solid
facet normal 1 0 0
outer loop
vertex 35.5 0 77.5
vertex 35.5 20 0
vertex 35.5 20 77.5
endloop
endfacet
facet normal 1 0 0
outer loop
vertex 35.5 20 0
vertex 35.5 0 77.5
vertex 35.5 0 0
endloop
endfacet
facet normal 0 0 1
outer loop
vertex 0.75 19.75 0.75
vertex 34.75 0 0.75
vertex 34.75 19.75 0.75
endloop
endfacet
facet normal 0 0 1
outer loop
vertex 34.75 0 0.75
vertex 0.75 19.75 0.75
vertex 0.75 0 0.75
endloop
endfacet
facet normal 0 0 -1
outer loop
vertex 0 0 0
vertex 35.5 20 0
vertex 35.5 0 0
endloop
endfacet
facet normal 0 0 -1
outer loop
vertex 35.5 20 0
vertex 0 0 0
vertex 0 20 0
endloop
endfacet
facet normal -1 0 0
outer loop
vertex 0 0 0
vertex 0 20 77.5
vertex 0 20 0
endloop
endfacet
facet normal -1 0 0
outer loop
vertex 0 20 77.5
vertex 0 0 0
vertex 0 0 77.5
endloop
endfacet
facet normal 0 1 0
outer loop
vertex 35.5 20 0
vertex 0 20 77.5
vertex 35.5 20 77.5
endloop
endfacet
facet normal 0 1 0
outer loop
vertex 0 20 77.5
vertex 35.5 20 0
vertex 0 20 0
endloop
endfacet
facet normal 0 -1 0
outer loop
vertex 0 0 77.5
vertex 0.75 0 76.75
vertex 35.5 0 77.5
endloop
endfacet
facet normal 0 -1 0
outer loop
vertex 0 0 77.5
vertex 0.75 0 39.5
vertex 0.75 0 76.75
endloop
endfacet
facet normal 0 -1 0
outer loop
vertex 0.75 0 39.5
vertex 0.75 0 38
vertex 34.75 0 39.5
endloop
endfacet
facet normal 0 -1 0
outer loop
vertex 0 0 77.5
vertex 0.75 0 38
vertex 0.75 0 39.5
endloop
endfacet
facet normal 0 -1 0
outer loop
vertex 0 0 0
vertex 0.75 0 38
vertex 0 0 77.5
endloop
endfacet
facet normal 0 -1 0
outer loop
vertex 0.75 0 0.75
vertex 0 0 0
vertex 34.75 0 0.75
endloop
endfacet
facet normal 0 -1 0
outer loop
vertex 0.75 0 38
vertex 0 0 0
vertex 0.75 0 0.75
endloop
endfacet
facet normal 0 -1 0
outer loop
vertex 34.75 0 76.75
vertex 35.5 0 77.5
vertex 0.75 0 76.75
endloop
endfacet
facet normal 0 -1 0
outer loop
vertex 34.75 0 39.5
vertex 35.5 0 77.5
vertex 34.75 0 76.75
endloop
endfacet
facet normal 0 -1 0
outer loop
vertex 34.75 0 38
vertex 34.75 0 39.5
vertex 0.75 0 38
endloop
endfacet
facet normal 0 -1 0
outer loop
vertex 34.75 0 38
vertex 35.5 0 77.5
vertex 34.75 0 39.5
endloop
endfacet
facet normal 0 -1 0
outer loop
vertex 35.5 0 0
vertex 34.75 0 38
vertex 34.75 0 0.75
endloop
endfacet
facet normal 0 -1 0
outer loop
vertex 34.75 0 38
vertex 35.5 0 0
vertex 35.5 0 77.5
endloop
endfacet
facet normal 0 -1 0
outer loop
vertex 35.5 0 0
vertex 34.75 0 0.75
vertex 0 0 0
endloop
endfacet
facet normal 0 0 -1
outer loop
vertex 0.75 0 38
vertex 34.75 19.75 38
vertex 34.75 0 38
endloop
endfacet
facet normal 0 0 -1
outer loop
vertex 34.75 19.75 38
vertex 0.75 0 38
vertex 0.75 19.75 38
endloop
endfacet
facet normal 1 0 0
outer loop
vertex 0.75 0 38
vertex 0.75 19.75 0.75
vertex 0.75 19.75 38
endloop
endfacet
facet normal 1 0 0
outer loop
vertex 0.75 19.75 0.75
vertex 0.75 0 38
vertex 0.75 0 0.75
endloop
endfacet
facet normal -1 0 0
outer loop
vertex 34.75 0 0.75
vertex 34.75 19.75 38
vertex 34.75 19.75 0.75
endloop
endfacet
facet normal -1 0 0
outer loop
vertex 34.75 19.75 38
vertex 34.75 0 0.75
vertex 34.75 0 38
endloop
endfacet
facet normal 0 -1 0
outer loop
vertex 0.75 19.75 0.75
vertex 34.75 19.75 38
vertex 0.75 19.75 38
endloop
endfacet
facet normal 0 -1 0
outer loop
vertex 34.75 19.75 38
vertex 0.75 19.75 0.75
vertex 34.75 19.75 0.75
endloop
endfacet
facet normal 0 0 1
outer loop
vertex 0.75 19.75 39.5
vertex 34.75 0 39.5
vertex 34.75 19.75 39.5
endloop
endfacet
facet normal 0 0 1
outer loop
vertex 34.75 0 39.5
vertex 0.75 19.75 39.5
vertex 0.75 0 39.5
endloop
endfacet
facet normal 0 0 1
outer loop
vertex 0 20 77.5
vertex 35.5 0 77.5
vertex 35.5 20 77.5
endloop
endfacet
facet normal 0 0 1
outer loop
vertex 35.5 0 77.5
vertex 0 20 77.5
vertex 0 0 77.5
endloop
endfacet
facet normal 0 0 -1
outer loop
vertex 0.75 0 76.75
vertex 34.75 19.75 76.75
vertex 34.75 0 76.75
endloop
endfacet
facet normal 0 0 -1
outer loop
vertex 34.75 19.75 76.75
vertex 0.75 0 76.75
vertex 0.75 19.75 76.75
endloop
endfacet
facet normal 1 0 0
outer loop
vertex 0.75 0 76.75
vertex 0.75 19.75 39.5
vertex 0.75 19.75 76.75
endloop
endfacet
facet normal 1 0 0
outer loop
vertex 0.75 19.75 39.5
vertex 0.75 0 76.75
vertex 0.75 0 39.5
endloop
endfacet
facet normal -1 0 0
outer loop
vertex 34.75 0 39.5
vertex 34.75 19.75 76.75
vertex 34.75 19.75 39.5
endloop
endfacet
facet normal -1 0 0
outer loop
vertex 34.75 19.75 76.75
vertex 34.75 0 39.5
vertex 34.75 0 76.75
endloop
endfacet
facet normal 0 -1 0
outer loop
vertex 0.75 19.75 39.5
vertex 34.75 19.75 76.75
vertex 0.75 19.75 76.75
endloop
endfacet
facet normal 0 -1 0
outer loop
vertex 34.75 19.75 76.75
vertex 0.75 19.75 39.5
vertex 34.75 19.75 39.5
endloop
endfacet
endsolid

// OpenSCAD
// --- PARÁMETROS EN PULGADAS ---
ancho = 35 + 1/2; 
alto  = 38 + 3/4;   // Alto de un solo gabinete
fondo = 20;         // Ajusta esto a tu medida en pulgadas (ej. 20 o 24)
t     = 3/4;        // Grosor de la madera (Triplay/Plywood)

// Factor de suavidad para cilindros (si añades tornillos o agujeros luego)
$fn = 50;

module gabinete_individual() {
    color("linen") {
        // Suelo
        cube([ancho, fondo, t]);
        
        // Techo
        translate([0, 0, alto - t]) 
            cube([ancho, fondo, t]);
        
        // Lateral Izquierdo (va entre el suelo y el techo)
        translate([0, 0, t]) 
            cube([t, fondo, alto - (2 * t)]);
        
        // Lateral Derecho
        translate([ancho - t, 0, t]) 
            cube([t, fondo, alto - (2 * t)]);
        
        // Fondo / Trasera (embutida 1/4 pulgada para que no se vea de lado)
        translate([t, fondo - 1/4, t]) 
            color("gray") 
            cube([ancho - (2 * t), 1/4, alto - (2 * t)]);
    }
}

// --- ENSAMBLE FINAL ---

// Gabinete de ABAJO
gabinete_individual();

// Gabinete de ARRIBA
translate([0, 0, alto]) 
    gabinete_individual();

// --- REFERENCIA DE LA PARED (en pulgadas) ---
// Convertimos los 2400mm a unas 94 pulgadas aprox.
%union() {
    cube([100, 0.5, 94]); // Pared fondo
    cube([0.5, 100, 94]); // Pared lateral
}


// Doors
Door_Frame_W = 2.5;  // Width of the Shaker frame (stiles/rails)
Door_Panel_Inset = 0.25; // How deep the center panel is recessed
Door_Gap = 0.125;    // Gap between the two doors
Door_Open_Angle = 0; // Set to 90 to see them open!


module shaker_door(dw, dh) {
    color("white") union() {
        difference() {
            // The main door slab
            cube([dw, 0.75, dh]); 
            
            // The recessed middle part
            translate([Door_Frame_W, -0.1, Door_Frame_W])
                cube([dw - (Door_Frame_W * 2), Door_Panel_Inset + 0.1, dh - (Door_Frame_W * 2)]);
        }
    }
}

module cabinet(h) {
    // ... (keep your previous box code here) ...

    door_w = (Unit_Width / 2) - (Door_Gap * 1.5);
    door_h = h - (Door_Gap * 2);

    // LEFT DOOR
    translate([Door_Gap, -0.75, Door_Gap])
    rotate([0, 0, -Door_Open_Angle]) // Hinged on the left
        shaker_door(door_w, door_h);

    // RIGHT DOOR
    translate([Unit_Width - Door_Gap, -0.75, Door_Gap])
    rotate([0, 0, Door_Open_Angle]) 
    translate([-door_w, 0, 0])      // Hinged on the right
        shaker_door(door_w, door_h);
}
